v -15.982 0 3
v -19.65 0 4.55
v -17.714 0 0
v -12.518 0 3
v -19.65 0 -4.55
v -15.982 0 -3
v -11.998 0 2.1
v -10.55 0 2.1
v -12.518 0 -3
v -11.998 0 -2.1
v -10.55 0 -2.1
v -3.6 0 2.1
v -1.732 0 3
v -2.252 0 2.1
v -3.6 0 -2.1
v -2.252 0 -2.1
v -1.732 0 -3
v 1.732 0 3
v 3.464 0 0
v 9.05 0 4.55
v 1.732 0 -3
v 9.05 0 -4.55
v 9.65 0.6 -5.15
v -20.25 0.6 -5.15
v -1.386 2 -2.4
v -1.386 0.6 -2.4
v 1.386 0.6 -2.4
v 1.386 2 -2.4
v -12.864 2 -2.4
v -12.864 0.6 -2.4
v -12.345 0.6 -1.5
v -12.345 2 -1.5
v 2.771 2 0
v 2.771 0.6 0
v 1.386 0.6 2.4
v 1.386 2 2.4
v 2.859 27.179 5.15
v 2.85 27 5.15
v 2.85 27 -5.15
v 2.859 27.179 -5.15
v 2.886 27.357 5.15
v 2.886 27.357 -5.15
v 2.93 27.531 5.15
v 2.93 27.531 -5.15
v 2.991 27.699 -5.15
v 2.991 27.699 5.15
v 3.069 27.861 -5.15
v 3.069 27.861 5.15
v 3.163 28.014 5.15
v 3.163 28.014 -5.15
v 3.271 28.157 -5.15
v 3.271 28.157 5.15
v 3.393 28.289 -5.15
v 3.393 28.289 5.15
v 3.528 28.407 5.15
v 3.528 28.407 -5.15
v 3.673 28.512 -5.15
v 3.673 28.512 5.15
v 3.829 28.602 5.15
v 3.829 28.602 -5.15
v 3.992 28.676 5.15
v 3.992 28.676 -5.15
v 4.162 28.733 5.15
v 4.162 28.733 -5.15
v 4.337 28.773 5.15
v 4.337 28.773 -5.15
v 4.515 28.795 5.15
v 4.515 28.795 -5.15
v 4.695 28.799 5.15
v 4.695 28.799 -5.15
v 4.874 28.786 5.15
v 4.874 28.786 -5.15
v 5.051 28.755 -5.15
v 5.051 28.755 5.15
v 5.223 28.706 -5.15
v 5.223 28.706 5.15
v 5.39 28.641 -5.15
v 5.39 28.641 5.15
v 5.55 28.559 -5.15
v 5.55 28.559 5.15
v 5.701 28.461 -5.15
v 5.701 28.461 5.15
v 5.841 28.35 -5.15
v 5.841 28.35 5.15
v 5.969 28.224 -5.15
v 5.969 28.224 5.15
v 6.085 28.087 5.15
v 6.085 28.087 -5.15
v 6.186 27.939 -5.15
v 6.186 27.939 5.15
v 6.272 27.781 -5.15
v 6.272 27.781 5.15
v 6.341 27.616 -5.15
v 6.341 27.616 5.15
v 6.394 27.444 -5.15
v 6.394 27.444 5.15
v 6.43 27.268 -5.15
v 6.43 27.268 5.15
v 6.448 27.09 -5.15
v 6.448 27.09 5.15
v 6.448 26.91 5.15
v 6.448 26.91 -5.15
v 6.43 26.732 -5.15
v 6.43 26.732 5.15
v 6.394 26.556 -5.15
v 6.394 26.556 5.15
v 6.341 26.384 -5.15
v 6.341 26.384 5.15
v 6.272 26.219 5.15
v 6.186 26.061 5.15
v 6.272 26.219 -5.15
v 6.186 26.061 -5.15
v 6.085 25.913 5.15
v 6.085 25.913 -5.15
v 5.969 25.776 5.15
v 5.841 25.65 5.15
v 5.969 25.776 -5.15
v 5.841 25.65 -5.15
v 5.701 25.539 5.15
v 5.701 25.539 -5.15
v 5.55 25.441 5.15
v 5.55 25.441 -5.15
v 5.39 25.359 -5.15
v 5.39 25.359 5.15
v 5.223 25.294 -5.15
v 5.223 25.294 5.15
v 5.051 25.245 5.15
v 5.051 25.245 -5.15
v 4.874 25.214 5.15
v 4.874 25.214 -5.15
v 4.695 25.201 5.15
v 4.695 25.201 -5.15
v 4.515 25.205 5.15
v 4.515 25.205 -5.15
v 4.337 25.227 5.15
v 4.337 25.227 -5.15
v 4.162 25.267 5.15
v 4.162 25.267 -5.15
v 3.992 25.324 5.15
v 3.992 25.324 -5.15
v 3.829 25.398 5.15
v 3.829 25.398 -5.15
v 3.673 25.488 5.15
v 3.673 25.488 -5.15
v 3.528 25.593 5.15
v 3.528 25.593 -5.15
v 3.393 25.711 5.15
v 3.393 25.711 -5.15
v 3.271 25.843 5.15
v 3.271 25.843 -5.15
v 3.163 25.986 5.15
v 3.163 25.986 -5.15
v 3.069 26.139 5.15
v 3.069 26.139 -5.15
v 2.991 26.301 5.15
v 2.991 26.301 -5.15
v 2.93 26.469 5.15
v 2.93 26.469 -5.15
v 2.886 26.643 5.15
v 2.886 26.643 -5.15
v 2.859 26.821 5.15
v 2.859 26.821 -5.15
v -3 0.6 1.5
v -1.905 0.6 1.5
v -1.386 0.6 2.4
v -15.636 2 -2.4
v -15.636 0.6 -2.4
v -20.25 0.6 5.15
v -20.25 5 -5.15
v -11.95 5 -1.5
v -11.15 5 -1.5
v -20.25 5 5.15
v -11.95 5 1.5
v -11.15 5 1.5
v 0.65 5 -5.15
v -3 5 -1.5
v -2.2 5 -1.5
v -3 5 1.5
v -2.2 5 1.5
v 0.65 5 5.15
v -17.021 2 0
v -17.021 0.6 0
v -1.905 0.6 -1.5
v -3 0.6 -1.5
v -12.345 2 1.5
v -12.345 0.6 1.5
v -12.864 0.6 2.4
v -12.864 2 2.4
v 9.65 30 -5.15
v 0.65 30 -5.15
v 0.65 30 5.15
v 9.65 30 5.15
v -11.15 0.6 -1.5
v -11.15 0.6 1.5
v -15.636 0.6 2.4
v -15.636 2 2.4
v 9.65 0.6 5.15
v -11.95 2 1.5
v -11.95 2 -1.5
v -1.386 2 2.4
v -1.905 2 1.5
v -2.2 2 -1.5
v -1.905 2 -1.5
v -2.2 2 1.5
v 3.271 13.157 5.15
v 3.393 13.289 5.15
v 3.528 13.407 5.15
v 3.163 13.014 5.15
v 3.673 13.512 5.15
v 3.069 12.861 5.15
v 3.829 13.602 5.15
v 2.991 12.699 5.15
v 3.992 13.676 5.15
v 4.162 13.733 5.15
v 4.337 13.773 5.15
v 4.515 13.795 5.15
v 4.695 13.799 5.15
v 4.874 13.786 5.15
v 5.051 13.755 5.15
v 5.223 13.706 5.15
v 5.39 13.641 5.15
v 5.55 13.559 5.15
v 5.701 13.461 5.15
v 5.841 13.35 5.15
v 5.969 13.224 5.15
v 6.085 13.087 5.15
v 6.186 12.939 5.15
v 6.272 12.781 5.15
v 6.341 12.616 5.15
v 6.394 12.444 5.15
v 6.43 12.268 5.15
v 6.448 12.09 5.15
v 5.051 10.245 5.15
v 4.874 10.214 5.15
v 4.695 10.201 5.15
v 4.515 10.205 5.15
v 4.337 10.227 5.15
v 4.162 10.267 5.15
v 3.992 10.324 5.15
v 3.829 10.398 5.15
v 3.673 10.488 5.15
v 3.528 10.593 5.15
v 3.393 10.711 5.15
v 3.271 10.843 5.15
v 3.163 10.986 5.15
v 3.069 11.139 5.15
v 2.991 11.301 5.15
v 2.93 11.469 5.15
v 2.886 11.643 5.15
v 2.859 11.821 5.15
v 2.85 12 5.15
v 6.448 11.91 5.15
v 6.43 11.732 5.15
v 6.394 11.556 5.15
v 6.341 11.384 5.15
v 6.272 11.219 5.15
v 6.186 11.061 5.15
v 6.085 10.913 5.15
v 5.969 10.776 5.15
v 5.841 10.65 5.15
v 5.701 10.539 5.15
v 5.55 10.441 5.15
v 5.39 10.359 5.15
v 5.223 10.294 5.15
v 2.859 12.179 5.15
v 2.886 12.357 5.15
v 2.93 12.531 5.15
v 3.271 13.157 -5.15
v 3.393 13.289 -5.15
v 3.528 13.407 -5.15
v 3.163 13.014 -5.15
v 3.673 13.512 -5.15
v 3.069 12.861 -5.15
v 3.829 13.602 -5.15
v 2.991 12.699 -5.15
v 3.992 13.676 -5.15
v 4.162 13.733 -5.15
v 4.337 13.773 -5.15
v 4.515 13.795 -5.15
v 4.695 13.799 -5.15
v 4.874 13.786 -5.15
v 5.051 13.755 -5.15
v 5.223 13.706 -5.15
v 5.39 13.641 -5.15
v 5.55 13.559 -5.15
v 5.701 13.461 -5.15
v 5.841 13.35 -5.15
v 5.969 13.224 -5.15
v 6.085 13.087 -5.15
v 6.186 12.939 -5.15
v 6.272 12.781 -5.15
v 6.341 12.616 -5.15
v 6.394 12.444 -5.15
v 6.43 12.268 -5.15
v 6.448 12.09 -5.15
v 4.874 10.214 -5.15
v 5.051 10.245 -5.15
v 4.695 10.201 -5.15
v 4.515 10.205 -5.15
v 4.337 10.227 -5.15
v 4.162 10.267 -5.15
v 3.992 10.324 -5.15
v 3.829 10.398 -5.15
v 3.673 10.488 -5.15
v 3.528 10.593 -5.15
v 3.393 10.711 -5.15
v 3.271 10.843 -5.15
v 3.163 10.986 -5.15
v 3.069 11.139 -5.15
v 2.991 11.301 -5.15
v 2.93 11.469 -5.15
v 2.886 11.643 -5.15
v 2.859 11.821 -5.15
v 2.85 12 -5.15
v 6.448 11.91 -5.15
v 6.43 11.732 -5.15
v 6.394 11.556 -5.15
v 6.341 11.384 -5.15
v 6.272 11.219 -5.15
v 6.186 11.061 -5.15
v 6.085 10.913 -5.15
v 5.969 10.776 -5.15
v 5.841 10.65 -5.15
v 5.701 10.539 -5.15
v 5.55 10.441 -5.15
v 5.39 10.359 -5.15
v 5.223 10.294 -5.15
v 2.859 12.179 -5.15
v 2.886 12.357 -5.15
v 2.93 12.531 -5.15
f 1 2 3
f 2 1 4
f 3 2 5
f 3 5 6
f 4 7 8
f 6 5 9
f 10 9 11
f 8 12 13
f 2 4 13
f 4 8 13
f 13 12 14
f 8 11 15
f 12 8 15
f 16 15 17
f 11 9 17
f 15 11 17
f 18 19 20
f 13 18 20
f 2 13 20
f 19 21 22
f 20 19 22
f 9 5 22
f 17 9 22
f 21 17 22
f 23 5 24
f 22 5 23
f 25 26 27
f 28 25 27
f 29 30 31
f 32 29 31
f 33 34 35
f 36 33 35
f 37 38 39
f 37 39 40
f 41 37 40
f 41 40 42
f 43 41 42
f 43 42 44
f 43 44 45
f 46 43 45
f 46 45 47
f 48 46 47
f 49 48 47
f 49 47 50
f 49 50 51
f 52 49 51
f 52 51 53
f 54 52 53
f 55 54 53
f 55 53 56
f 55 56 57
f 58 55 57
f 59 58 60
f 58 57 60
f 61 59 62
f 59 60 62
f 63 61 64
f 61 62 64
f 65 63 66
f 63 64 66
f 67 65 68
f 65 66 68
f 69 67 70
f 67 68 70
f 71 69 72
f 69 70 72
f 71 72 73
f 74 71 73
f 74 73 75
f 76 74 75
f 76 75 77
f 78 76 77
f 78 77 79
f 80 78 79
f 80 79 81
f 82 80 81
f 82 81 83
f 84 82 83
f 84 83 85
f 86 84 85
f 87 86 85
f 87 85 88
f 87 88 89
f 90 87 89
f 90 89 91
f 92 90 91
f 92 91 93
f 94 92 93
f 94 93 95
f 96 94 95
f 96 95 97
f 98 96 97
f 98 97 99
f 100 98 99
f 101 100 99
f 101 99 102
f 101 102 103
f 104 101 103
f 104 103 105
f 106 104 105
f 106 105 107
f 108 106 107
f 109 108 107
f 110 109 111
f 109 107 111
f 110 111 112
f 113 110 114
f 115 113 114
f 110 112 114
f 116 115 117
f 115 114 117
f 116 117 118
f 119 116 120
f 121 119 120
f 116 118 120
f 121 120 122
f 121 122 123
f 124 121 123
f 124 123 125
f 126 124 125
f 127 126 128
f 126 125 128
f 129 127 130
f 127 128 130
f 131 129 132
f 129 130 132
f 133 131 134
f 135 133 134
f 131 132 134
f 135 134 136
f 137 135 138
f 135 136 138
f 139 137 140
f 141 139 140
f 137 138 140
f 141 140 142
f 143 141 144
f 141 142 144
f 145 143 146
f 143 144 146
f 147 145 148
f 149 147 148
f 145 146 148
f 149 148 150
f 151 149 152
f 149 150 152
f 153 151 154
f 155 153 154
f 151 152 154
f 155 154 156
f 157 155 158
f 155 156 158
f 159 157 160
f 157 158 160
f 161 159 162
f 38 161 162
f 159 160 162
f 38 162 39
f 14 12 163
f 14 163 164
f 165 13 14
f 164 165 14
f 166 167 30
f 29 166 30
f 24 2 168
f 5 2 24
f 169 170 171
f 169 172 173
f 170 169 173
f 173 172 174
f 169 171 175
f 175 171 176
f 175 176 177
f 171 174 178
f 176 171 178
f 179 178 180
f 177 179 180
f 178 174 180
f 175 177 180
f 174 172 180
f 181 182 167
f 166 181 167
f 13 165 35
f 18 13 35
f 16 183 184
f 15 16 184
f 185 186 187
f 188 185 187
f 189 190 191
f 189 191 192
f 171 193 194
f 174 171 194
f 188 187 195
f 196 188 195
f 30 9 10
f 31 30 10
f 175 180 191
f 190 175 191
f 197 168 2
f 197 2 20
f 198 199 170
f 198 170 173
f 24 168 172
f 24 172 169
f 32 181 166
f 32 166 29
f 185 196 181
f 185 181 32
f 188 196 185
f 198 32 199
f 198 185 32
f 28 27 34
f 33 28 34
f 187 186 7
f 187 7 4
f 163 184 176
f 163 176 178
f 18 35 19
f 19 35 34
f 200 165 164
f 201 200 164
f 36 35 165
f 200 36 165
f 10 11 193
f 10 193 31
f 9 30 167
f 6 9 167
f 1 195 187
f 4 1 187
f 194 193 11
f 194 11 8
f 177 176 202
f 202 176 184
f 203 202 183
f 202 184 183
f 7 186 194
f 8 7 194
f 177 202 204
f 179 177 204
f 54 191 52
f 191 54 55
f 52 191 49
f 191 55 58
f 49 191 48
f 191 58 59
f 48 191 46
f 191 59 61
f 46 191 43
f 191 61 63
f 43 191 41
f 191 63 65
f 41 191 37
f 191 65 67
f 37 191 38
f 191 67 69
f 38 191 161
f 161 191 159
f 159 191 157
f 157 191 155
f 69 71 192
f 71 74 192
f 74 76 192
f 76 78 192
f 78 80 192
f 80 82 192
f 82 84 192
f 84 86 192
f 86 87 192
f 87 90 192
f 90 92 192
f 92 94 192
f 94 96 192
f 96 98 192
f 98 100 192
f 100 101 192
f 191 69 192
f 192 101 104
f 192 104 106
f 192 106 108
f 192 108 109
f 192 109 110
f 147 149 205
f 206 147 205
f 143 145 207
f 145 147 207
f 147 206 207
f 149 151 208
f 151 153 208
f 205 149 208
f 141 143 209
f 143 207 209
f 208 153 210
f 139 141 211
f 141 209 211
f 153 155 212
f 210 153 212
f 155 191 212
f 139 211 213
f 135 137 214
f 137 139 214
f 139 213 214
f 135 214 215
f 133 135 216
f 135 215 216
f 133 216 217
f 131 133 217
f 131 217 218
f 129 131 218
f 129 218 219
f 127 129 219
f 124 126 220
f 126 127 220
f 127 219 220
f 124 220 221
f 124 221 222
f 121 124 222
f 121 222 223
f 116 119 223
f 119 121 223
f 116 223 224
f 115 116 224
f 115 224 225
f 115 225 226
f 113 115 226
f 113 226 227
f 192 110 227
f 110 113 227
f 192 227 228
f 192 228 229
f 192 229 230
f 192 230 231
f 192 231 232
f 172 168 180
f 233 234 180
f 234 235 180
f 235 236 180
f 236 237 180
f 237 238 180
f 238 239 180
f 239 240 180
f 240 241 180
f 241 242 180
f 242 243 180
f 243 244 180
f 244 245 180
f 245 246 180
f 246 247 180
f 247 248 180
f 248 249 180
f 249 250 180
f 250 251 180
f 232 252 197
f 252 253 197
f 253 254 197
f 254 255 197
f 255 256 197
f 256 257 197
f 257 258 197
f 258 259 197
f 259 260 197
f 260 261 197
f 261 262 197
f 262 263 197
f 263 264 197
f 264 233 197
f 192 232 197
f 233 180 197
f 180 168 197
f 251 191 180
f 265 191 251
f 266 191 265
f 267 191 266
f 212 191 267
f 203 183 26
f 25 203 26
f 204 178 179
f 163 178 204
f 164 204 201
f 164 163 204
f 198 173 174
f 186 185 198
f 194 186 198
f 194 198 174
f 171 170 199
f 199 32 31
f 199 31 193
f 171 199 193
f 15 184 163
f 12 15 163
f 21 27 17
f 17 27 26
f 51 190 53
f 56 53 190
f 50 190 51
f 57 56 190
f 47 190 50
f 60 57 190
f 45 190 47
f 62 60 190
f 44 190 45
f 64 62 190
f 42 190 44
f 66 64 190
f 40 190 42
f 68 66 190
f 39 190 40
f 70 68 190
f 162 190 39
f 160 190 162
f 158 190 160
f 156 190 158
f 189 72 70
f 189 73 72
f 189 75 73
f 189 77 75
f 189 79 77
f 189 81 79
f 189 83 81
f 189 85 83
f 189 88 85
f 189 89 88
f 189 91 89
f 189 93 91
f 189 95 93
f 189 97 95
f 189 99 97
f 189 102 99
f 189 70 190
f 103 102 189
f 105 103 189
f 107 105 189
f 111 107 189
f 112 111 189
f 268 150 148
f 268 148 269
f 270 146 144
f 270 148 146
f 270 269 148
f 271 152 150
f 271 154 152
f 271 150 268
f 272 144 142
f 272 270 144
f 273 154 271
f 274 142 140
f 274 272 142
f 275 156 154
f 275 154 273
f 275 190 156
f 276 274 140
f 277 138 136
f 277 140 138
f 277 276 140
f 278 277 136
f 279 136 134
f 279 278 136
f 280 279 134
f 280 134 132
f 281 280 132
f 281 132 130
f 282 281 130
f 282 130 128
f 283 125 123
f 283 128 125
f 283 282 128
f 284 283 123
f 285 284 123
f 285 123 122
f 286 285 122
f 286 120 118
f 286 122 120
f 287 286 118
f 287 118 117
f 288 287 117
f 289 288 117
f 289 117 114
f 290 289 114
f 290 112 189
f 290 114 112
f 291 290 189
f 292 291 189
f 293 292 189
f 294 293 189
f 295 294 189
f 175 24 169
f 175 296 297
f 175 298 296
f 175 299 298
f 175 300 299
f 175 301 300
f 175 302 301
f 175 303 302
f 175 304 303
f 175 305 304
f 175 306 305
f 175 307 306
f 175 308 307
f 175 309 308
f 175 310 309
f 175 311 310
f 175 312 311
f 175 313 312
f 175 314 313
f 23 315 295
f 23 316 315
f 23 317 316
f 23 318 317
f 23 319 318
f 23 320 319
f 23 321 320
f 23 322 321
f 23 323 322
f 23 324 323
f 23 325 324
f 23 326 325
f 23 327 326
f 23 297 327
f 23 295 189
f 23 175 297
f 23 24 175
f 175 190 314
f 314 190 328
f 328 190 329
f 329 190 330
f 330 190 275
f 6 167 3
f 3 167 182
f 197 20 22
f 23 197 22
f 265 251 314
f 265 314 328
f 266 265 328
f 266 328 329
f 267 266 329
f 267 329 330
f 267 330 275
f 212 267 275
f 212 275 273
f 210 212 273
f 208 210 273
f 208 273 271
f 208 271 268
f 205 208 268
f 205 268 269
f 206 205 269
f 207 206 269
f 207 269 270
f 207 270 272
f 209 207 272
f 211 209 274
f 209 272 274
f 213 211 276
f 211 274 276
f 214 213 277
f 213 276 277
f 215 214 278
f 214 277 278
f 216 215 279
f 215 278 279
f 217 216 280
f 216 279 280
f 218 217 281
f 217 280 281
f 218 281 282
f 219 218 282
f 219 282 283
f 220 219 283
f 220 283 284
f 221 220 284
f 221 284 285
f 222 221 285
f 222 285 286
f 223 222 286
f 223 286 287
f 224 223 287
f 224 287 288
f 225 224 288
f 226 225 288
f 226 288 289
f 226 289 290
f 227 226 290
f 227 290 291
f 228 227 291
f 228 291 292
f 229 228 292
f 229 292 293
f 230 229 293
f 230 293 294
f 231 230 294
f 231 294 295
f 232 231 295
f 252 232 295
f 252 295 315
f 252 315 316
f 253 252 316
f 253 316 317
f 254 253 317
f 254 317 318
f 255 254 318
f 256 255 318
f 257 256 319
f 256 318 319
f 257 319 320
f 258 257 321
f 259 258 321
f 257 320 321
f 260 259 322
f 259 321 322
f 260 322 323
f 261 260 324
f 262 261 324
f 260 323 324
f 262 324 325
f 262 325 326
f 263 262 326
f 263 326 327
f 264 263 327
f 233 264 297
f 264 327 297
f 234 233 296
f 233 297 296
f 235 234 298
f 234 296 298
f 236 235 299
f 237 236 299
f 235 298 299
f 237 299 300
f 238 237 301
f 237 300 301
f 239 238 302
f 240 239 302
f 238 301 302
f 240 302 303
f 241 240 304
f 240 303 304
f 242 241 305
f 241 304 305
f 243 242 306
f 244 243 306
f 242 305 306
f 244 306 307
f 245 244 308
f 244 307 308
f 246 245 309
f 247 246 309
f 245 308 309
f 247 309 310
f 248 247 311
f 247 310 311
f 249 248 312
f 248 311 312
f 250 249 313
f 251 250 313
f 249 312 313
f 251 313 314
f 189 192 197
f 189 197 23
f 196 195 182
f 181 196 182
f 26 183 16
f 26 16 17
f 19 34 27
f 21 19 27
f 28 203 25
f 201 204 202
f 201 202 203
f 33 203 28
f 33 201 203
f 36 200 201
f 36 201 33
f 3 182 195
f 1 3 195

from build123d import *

# Parameters (mm, degrees)
SKETCH1_W            = 29.9
SKETCH1_H            = 10.3
SKETCH1_R            = 2.4
BOSS_EXTRUDE1_DEPTH  = 30
BOSS_EXTRUDE3_START  = -2
SKETCH4_W            = 29.9
SKETCH4_H            = 10.3
BOSS_EXTRUDE3_DEPTH  = 28
SKETCH2_W            = 20.9
SKETCH2_H            = 25
CUT_EXTRUDE1_DEPTH   = 11.3
SKETCH3_W            = 0.8
SKETCH3_H            = 3
CUT_EXTRUDE2_DEPTH   = 31
M3_CLEARANCE_HOLE1_D = 3.6
SKETCH7_W            = 1.2265006
SKETCH7_H            = 3
SKETCH7_W_2          = 1.1265006
CUT_EXTRUDE3_DEPTH   = 2
CUT_EXTRUDE4_DEPTH   = 2
CHAMFER1_SIZE        = 0.6


with BuildPart() as part:
    # Sketch1 → Boss-Extrude1 (new body)
    with BuildSketch(Plane(origin=(0, 0, 0), x_dir=(1, 0, 0), z_dir=(0, 1, 0))):
        with Locations((-5.3, 0)):
            Rectangle(SKETCH1_W, SKETCH1_H)
        Circle(SKETCH1_R, mode=Mode.SUBTRACT)
        with Locations((-14.25, 0)):
            Circle(SKETCH1_R, mode=Mode.SUBTRACT)
    extrude(amount=BOSS_EXTRUDE1_DEPTH)

    # Sketch4 → Boss-Extrude3 (add)
    with BuildSketch(Plane.XZ.offset(BOSS_EXTRUDE3_START)):
        with Locations((-5.3, 0)):
            Rectangle(SKETCH4_W, SKETCH4_H)
    extrude(amount=-BOSS_EXTRUDE3_DEPTH)

    # Sketch2 → Cut-Extrude1 (cut, through all)
    with BuildSketch(Plane.XY.offset(5.15)):
        with Locations((-9.8, 17.5)):
            Rectangle(SKETCH2_W, SKETCH2_H)
    extrude(amount=-CUT_EXTRUDE1_DEPTH, mode=Mode.SUBTRACT)

    # Sketch3 → Cut-Extrude2 (cut, through all)
    with BuildSketch(Plane.XZ):
        with Locations((-11.55, 0)):
            Rectangle(SKETCH3_W, SKETCH3_H)
        with Locations((-2.6, 0)):
            Rectangle(SKETCH3_W, SKETCH3_H)
    extrude(amount=-CUT_EXTRUDE2_DEPTH, mode=Mode.SUBTRACT)

    # M3 Clearance Hole1 (through all)
    with Locations(Plane.XY.offset(5.15)):
        with Locations((4.65, 12), (4.65, 27)):
            Hole(M3_CLEARANCE_HOLE1_D / 2)

    # Sketch7 → Cut-Extrude3 (cut)
    with BuildSketch(Plane.XZ):
        with Locations((-11.7632503, 0)):
            Rectangle(SKETCH7_W, SKETCH7_H)
        with Locations((-2.4367497, 0)):
            Rectangle(SKETCH7_W_2, SKETCH7_H)
    extrude(amount=-CUT_EXTRUDE3_DEPTH, mode=Mode.SUBTRACT)

    # Sketch8 → Cut-Extrude4 (cut)
    with BuildSketch(Plane.XZ):
        Polygon((-15.635640646, 2.4), (-17.021281292, 0), (-15.635640646, -2.4), (-12.864359354, -2.4), (-11.478718708, 0), (-12.864359354, 2.4), align=None)
        Polygon((1.385640646, 2.4), (-1.385640646, 2.4), (-2.771281292, 0), (-1.385640646, -2.4), (1.385640646, -2.4), (2.771281292, 0), align=None)
    extrude(amount=-CUT_EXTRUDE4_DEPTH, mode=Mode.SUBTRACT)

    # Chamfer1
    chamfer1_edges = [part.edges().sort_by_distance(p)[0] for p in [
        (-11.747372056, 0, -1.5),
        (-2.452627944, 0, 1.5),
        (-12.604551733, 0, 1.95),
        (-14.25, 0, 2.4),
        (-16.328460969, 0, 1.2),
        (-16.328460969, 0, -1.2),
        (-14.25, 0, -2.4),
        (-12.604551733, 0, -1.95),
        (-1.645448267, 0, 1.95),
        (0, 0, 2.4),
        (2.078460969, 0, 1.2),
        (2.078460969, 0, -1.2),
        (0, 0, -2.4),
        (-1.645448267, 0, -1.95),
        (-5.3, 0, -5.15),
        (9.65, 0, 0),
        (-5.3, 0, 5.15),
        (-20.25, 0, 0),
        (-11.15, 0, 0),
        (-11.747372056, 0, 1.5),
        (-3, 0, 0),
        (-2.452627944, 0, -1.5),
    ]]
    chamfer(chamfer1_edges, length=CHAMFER1_SIZE)


solid = part.part
